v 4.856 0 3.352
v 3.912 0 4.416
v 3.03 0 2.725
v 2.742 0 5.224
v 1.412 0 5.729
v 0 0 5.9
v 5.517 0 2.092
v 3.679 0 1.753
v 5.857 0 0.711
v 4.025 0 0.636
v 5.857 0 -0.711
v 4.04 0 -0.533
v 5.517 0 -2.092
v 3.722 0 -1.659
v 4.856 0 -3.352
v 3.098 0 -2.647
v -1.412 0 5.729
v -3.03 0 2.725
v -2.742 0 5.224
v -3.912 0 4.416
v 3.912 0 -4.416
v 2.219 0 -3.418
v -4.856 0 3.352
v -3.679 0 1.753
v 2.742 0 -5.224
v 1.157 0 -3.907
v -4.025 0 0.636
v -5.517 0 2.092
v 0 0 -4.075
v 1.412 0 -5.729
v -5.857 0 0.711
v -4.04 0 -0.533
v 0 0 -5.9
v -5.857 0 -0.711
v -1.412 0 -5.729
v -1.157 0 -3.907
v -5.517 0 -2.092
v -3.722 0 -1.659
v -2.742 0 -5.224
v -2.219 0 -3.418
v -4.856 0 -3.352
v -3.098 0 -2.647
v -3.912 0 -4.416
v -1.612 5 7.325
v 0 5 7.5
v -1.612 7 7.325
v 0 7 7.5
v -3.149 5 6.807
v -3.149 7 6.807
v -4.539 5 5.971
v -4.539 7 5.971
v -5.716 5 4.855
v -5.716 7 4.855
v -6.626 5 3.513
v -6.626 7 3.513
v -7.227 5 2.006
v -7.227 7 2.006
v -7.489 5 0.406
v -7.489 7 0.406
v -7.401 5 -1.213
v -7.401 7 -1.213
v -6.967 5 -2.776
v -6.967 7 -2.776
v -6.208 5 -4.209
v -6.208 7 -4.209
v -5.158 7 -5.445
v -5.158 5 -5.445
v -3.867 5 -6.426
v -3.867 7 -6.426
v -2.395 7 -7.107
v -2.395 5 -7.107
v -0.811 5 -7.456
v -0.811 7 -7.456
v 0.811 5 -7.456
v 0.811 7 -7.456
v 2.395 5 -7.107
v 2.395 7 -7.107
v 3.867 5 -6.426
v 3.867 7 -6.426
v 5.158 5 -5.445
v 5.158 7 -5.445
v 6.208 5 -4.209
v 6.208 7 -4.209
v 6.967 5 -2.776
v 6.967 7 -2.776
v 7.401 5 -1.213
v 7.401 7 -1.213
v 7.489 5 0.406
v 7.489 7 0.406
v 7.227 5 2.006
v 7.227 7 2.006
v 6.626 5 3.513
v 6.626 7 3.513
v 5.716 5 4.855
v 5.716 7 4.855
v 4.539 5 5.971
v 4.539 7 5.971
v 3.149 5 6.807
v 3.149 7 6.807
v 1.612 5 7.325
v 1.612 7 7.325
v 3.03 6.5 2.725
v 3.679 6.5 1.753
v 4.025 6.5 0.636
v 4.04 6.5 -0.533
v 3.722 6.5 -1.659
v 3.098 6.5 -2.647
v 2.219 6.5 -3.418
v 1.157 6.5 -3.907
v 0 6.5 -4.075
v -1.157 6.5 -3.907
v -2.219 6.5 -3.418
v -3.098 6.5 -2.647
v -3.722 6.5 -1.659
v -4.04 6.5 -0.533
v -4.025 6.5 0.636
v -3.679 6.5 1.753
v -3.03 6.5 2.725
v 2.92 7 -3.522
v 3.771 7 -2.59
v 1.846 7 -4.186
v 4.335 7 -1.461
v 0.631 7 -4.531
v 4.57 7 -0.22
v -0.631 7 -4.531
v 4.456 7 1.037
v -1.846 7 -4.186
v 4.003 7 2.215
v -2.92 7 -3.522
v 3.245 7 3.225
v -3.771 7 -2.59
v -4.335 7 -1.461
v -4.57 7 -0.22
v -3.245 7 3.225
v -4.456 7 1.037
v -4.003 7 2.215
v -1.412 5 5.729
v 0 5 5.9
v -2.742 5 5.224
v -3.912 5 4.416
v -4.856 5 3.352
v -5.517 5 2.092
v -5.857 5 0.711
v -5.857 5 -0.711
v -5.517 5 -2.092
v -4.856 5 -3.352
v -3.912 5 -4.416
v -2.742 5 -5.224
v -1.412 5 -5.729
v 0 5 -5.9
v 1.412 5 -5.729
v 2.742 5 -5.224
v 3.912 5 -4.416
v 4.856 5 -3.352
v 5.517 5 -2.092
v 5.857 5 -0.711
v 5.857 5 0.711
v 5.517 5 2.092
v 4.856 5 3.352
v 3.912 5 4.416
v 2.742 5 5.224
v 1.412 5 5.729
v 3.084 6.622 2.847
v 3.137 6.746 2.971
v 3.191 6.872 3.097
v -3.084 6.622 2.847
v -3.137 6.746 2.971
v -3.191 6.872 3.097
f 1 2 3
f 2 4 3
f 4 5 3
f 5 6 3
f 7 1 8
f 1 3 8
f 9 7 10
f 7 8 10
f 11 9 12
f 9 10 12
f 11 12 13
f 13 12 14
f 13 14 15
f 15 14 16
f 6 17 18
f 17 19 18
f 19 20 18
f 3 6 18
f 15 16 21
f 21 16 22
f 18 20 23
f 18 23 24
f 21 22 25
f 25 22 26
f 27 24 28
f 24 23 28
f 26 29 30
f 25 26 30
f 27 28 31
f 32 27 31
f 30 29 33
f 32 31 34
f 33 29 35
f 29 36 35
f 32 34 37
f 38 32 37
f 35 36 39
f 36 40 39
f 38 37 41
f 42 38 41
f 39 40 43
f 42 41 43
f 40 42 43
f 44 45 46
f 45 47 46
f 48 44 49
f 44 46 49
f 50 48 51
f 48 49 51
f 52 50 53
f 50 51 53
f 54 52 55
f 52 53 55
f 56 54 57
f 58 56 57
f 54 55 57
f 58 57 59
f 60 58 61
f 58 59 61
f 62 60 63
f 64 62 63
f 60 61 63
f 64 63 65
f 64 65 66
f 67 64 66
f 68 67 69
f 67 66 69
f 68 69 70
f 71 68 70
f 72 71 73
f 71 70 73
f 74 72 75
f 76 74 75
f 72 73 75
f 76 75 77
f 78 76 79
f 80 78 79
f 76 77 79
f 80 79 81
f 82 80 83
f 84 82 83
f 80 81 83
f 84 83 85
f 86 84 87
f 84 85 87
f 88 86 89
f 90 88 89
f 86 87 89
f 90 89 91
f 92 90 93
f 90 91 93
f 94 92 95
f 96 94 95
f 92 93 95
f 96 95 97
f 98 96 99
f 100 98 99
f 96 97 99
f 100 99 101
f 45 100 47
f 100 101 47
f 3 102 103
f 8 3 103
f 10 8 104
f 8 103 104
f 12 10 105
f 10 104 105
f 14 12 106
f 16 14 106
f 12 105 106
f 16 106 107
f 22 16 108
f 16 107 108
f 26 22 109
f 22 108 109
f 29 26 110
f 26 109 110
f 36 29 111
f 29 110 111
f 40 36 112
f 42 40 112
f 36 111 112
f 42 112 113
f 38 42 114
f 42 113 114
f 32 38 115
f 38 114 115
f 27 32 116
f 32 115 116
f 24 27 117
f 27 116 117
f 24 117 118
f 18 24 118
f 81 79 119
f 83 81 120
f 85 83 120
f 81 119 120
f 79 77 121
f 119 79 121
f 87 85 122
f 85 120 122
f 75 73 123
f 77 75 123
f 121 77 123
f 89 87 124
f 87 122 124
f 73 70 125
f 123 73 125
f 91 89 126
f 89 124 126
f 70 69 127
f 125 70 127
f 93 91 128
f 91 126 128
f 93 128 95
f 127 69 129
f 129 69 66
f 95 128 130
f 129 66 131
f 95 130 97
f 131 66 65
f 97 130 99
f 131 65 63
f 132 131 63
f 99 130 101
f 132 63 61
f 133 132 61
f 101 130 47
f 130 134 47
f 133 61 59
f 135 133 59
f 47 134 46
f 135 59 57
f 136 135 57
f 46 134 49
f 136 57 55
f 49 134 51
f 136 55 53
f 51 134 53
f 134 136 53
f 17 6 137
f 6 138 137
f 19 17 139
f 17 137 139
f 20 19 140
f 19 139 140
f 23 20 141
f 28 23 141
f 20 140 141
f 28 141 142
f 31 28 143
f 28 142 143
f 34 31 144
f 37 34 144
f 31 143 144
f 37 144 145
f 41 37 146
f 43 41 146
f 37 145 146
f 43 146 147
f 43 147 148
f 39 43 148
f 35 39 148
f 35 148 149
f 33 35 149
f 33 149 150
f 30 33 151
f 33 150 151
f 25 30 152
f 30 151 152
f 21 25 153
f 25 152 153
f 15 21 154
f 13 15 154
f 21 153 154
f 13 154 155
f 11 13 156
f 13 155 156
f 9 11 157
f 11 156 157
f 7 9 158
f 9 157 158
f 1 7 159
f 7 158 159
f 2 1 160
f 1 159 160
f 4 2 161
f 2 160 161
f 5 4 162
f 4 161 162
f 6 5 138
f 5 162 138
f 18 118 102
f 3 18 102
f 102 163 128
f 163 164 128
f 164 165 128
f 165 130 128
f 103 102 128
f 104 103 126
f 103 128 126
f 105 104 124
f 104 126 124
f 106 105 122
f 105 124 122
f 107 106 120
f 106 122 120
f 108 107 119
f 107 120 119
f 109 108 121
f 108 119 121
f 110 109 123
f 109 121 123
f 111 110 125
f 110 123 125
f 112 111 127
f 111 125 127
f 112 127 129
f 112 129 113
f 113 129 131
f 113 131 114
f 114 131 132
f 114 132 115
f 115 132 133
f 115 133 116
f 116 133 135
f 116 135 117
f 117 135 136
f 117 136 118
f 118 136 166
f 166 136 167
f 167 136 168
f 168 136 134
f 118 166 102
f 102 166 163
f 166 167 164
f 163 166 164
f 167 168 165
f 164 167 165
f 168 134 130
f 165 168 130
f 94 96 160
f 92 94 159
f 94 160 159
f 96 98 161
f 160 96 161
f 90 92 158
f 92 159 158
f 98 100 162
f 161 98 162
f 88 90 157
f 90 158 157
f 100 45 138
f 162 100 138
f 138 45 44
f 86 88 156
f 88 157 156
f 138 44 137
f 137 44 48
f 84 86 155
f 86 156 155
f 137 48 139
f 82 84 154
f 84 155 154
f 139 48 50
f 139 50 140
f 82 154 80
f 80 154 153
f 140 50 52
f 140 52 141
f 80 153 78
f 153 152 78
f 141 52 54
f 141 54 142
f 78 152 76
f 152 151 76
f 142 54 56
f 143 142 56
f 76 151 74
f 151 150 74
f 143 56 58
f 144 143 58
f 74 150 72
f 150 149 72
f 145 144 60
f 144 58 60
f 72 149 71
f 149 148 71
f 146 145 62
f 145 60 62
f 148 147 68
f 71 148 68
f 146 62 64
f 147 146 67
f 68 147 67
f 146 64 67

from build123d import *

# Parameters (mm, degrees)
SCHNITT_LINEAR_AUSTRAGEN1_DEPTH = 13.708265027
FASE1_SIZE                      = 0.5


with BuildPart() as part:
    # Skizze1 → Rotation1 (revolve)
    with BuildSketch(Plane.XY, mode=Mode.PRIVATE) as rotation1_sk:
        Polygon((0, 0), (5.9, 0), (5.9, 5), (7.5, 5), (7.5, 7), (0, 7), align=None)
    revolve(rotation1_sk.sketch.rotate(Axis((0, 0, 0), (0, -1, 0)), 90), axis=Axis((0, 0, 0), (0, -1, 0)))

    # Skizze2 → Schnitt-Linear austragen1 (cut, through all)
    with BuildSketch(Plane(origin=(0, 7, 0), x_dir=(1, 0, 0), z_dir=(0, 1, 0))):
        with BuildLine():
            Line((-3.029851482, -2.725), (3.029851482, -2.725))
            ThreePointArc((3.029851482, -2.725), (0, 4.075), (-3.029851482, -2.725))
        make_face()
    extrude(amount=-SCHNITT_LINEAR_AUSTRAGEN1_DEPTH, mode=Mode.SUBTRACT)

    # Fase1
    fase1_edges = [part.edges().sort_by_distance(p)[0] for p in [
        (0, 7, -4.075),
        (0, 7, 2.725),
    ]]
    chamfer(fase1_edges, length=FASE1_SIZE)


solid = part.part
